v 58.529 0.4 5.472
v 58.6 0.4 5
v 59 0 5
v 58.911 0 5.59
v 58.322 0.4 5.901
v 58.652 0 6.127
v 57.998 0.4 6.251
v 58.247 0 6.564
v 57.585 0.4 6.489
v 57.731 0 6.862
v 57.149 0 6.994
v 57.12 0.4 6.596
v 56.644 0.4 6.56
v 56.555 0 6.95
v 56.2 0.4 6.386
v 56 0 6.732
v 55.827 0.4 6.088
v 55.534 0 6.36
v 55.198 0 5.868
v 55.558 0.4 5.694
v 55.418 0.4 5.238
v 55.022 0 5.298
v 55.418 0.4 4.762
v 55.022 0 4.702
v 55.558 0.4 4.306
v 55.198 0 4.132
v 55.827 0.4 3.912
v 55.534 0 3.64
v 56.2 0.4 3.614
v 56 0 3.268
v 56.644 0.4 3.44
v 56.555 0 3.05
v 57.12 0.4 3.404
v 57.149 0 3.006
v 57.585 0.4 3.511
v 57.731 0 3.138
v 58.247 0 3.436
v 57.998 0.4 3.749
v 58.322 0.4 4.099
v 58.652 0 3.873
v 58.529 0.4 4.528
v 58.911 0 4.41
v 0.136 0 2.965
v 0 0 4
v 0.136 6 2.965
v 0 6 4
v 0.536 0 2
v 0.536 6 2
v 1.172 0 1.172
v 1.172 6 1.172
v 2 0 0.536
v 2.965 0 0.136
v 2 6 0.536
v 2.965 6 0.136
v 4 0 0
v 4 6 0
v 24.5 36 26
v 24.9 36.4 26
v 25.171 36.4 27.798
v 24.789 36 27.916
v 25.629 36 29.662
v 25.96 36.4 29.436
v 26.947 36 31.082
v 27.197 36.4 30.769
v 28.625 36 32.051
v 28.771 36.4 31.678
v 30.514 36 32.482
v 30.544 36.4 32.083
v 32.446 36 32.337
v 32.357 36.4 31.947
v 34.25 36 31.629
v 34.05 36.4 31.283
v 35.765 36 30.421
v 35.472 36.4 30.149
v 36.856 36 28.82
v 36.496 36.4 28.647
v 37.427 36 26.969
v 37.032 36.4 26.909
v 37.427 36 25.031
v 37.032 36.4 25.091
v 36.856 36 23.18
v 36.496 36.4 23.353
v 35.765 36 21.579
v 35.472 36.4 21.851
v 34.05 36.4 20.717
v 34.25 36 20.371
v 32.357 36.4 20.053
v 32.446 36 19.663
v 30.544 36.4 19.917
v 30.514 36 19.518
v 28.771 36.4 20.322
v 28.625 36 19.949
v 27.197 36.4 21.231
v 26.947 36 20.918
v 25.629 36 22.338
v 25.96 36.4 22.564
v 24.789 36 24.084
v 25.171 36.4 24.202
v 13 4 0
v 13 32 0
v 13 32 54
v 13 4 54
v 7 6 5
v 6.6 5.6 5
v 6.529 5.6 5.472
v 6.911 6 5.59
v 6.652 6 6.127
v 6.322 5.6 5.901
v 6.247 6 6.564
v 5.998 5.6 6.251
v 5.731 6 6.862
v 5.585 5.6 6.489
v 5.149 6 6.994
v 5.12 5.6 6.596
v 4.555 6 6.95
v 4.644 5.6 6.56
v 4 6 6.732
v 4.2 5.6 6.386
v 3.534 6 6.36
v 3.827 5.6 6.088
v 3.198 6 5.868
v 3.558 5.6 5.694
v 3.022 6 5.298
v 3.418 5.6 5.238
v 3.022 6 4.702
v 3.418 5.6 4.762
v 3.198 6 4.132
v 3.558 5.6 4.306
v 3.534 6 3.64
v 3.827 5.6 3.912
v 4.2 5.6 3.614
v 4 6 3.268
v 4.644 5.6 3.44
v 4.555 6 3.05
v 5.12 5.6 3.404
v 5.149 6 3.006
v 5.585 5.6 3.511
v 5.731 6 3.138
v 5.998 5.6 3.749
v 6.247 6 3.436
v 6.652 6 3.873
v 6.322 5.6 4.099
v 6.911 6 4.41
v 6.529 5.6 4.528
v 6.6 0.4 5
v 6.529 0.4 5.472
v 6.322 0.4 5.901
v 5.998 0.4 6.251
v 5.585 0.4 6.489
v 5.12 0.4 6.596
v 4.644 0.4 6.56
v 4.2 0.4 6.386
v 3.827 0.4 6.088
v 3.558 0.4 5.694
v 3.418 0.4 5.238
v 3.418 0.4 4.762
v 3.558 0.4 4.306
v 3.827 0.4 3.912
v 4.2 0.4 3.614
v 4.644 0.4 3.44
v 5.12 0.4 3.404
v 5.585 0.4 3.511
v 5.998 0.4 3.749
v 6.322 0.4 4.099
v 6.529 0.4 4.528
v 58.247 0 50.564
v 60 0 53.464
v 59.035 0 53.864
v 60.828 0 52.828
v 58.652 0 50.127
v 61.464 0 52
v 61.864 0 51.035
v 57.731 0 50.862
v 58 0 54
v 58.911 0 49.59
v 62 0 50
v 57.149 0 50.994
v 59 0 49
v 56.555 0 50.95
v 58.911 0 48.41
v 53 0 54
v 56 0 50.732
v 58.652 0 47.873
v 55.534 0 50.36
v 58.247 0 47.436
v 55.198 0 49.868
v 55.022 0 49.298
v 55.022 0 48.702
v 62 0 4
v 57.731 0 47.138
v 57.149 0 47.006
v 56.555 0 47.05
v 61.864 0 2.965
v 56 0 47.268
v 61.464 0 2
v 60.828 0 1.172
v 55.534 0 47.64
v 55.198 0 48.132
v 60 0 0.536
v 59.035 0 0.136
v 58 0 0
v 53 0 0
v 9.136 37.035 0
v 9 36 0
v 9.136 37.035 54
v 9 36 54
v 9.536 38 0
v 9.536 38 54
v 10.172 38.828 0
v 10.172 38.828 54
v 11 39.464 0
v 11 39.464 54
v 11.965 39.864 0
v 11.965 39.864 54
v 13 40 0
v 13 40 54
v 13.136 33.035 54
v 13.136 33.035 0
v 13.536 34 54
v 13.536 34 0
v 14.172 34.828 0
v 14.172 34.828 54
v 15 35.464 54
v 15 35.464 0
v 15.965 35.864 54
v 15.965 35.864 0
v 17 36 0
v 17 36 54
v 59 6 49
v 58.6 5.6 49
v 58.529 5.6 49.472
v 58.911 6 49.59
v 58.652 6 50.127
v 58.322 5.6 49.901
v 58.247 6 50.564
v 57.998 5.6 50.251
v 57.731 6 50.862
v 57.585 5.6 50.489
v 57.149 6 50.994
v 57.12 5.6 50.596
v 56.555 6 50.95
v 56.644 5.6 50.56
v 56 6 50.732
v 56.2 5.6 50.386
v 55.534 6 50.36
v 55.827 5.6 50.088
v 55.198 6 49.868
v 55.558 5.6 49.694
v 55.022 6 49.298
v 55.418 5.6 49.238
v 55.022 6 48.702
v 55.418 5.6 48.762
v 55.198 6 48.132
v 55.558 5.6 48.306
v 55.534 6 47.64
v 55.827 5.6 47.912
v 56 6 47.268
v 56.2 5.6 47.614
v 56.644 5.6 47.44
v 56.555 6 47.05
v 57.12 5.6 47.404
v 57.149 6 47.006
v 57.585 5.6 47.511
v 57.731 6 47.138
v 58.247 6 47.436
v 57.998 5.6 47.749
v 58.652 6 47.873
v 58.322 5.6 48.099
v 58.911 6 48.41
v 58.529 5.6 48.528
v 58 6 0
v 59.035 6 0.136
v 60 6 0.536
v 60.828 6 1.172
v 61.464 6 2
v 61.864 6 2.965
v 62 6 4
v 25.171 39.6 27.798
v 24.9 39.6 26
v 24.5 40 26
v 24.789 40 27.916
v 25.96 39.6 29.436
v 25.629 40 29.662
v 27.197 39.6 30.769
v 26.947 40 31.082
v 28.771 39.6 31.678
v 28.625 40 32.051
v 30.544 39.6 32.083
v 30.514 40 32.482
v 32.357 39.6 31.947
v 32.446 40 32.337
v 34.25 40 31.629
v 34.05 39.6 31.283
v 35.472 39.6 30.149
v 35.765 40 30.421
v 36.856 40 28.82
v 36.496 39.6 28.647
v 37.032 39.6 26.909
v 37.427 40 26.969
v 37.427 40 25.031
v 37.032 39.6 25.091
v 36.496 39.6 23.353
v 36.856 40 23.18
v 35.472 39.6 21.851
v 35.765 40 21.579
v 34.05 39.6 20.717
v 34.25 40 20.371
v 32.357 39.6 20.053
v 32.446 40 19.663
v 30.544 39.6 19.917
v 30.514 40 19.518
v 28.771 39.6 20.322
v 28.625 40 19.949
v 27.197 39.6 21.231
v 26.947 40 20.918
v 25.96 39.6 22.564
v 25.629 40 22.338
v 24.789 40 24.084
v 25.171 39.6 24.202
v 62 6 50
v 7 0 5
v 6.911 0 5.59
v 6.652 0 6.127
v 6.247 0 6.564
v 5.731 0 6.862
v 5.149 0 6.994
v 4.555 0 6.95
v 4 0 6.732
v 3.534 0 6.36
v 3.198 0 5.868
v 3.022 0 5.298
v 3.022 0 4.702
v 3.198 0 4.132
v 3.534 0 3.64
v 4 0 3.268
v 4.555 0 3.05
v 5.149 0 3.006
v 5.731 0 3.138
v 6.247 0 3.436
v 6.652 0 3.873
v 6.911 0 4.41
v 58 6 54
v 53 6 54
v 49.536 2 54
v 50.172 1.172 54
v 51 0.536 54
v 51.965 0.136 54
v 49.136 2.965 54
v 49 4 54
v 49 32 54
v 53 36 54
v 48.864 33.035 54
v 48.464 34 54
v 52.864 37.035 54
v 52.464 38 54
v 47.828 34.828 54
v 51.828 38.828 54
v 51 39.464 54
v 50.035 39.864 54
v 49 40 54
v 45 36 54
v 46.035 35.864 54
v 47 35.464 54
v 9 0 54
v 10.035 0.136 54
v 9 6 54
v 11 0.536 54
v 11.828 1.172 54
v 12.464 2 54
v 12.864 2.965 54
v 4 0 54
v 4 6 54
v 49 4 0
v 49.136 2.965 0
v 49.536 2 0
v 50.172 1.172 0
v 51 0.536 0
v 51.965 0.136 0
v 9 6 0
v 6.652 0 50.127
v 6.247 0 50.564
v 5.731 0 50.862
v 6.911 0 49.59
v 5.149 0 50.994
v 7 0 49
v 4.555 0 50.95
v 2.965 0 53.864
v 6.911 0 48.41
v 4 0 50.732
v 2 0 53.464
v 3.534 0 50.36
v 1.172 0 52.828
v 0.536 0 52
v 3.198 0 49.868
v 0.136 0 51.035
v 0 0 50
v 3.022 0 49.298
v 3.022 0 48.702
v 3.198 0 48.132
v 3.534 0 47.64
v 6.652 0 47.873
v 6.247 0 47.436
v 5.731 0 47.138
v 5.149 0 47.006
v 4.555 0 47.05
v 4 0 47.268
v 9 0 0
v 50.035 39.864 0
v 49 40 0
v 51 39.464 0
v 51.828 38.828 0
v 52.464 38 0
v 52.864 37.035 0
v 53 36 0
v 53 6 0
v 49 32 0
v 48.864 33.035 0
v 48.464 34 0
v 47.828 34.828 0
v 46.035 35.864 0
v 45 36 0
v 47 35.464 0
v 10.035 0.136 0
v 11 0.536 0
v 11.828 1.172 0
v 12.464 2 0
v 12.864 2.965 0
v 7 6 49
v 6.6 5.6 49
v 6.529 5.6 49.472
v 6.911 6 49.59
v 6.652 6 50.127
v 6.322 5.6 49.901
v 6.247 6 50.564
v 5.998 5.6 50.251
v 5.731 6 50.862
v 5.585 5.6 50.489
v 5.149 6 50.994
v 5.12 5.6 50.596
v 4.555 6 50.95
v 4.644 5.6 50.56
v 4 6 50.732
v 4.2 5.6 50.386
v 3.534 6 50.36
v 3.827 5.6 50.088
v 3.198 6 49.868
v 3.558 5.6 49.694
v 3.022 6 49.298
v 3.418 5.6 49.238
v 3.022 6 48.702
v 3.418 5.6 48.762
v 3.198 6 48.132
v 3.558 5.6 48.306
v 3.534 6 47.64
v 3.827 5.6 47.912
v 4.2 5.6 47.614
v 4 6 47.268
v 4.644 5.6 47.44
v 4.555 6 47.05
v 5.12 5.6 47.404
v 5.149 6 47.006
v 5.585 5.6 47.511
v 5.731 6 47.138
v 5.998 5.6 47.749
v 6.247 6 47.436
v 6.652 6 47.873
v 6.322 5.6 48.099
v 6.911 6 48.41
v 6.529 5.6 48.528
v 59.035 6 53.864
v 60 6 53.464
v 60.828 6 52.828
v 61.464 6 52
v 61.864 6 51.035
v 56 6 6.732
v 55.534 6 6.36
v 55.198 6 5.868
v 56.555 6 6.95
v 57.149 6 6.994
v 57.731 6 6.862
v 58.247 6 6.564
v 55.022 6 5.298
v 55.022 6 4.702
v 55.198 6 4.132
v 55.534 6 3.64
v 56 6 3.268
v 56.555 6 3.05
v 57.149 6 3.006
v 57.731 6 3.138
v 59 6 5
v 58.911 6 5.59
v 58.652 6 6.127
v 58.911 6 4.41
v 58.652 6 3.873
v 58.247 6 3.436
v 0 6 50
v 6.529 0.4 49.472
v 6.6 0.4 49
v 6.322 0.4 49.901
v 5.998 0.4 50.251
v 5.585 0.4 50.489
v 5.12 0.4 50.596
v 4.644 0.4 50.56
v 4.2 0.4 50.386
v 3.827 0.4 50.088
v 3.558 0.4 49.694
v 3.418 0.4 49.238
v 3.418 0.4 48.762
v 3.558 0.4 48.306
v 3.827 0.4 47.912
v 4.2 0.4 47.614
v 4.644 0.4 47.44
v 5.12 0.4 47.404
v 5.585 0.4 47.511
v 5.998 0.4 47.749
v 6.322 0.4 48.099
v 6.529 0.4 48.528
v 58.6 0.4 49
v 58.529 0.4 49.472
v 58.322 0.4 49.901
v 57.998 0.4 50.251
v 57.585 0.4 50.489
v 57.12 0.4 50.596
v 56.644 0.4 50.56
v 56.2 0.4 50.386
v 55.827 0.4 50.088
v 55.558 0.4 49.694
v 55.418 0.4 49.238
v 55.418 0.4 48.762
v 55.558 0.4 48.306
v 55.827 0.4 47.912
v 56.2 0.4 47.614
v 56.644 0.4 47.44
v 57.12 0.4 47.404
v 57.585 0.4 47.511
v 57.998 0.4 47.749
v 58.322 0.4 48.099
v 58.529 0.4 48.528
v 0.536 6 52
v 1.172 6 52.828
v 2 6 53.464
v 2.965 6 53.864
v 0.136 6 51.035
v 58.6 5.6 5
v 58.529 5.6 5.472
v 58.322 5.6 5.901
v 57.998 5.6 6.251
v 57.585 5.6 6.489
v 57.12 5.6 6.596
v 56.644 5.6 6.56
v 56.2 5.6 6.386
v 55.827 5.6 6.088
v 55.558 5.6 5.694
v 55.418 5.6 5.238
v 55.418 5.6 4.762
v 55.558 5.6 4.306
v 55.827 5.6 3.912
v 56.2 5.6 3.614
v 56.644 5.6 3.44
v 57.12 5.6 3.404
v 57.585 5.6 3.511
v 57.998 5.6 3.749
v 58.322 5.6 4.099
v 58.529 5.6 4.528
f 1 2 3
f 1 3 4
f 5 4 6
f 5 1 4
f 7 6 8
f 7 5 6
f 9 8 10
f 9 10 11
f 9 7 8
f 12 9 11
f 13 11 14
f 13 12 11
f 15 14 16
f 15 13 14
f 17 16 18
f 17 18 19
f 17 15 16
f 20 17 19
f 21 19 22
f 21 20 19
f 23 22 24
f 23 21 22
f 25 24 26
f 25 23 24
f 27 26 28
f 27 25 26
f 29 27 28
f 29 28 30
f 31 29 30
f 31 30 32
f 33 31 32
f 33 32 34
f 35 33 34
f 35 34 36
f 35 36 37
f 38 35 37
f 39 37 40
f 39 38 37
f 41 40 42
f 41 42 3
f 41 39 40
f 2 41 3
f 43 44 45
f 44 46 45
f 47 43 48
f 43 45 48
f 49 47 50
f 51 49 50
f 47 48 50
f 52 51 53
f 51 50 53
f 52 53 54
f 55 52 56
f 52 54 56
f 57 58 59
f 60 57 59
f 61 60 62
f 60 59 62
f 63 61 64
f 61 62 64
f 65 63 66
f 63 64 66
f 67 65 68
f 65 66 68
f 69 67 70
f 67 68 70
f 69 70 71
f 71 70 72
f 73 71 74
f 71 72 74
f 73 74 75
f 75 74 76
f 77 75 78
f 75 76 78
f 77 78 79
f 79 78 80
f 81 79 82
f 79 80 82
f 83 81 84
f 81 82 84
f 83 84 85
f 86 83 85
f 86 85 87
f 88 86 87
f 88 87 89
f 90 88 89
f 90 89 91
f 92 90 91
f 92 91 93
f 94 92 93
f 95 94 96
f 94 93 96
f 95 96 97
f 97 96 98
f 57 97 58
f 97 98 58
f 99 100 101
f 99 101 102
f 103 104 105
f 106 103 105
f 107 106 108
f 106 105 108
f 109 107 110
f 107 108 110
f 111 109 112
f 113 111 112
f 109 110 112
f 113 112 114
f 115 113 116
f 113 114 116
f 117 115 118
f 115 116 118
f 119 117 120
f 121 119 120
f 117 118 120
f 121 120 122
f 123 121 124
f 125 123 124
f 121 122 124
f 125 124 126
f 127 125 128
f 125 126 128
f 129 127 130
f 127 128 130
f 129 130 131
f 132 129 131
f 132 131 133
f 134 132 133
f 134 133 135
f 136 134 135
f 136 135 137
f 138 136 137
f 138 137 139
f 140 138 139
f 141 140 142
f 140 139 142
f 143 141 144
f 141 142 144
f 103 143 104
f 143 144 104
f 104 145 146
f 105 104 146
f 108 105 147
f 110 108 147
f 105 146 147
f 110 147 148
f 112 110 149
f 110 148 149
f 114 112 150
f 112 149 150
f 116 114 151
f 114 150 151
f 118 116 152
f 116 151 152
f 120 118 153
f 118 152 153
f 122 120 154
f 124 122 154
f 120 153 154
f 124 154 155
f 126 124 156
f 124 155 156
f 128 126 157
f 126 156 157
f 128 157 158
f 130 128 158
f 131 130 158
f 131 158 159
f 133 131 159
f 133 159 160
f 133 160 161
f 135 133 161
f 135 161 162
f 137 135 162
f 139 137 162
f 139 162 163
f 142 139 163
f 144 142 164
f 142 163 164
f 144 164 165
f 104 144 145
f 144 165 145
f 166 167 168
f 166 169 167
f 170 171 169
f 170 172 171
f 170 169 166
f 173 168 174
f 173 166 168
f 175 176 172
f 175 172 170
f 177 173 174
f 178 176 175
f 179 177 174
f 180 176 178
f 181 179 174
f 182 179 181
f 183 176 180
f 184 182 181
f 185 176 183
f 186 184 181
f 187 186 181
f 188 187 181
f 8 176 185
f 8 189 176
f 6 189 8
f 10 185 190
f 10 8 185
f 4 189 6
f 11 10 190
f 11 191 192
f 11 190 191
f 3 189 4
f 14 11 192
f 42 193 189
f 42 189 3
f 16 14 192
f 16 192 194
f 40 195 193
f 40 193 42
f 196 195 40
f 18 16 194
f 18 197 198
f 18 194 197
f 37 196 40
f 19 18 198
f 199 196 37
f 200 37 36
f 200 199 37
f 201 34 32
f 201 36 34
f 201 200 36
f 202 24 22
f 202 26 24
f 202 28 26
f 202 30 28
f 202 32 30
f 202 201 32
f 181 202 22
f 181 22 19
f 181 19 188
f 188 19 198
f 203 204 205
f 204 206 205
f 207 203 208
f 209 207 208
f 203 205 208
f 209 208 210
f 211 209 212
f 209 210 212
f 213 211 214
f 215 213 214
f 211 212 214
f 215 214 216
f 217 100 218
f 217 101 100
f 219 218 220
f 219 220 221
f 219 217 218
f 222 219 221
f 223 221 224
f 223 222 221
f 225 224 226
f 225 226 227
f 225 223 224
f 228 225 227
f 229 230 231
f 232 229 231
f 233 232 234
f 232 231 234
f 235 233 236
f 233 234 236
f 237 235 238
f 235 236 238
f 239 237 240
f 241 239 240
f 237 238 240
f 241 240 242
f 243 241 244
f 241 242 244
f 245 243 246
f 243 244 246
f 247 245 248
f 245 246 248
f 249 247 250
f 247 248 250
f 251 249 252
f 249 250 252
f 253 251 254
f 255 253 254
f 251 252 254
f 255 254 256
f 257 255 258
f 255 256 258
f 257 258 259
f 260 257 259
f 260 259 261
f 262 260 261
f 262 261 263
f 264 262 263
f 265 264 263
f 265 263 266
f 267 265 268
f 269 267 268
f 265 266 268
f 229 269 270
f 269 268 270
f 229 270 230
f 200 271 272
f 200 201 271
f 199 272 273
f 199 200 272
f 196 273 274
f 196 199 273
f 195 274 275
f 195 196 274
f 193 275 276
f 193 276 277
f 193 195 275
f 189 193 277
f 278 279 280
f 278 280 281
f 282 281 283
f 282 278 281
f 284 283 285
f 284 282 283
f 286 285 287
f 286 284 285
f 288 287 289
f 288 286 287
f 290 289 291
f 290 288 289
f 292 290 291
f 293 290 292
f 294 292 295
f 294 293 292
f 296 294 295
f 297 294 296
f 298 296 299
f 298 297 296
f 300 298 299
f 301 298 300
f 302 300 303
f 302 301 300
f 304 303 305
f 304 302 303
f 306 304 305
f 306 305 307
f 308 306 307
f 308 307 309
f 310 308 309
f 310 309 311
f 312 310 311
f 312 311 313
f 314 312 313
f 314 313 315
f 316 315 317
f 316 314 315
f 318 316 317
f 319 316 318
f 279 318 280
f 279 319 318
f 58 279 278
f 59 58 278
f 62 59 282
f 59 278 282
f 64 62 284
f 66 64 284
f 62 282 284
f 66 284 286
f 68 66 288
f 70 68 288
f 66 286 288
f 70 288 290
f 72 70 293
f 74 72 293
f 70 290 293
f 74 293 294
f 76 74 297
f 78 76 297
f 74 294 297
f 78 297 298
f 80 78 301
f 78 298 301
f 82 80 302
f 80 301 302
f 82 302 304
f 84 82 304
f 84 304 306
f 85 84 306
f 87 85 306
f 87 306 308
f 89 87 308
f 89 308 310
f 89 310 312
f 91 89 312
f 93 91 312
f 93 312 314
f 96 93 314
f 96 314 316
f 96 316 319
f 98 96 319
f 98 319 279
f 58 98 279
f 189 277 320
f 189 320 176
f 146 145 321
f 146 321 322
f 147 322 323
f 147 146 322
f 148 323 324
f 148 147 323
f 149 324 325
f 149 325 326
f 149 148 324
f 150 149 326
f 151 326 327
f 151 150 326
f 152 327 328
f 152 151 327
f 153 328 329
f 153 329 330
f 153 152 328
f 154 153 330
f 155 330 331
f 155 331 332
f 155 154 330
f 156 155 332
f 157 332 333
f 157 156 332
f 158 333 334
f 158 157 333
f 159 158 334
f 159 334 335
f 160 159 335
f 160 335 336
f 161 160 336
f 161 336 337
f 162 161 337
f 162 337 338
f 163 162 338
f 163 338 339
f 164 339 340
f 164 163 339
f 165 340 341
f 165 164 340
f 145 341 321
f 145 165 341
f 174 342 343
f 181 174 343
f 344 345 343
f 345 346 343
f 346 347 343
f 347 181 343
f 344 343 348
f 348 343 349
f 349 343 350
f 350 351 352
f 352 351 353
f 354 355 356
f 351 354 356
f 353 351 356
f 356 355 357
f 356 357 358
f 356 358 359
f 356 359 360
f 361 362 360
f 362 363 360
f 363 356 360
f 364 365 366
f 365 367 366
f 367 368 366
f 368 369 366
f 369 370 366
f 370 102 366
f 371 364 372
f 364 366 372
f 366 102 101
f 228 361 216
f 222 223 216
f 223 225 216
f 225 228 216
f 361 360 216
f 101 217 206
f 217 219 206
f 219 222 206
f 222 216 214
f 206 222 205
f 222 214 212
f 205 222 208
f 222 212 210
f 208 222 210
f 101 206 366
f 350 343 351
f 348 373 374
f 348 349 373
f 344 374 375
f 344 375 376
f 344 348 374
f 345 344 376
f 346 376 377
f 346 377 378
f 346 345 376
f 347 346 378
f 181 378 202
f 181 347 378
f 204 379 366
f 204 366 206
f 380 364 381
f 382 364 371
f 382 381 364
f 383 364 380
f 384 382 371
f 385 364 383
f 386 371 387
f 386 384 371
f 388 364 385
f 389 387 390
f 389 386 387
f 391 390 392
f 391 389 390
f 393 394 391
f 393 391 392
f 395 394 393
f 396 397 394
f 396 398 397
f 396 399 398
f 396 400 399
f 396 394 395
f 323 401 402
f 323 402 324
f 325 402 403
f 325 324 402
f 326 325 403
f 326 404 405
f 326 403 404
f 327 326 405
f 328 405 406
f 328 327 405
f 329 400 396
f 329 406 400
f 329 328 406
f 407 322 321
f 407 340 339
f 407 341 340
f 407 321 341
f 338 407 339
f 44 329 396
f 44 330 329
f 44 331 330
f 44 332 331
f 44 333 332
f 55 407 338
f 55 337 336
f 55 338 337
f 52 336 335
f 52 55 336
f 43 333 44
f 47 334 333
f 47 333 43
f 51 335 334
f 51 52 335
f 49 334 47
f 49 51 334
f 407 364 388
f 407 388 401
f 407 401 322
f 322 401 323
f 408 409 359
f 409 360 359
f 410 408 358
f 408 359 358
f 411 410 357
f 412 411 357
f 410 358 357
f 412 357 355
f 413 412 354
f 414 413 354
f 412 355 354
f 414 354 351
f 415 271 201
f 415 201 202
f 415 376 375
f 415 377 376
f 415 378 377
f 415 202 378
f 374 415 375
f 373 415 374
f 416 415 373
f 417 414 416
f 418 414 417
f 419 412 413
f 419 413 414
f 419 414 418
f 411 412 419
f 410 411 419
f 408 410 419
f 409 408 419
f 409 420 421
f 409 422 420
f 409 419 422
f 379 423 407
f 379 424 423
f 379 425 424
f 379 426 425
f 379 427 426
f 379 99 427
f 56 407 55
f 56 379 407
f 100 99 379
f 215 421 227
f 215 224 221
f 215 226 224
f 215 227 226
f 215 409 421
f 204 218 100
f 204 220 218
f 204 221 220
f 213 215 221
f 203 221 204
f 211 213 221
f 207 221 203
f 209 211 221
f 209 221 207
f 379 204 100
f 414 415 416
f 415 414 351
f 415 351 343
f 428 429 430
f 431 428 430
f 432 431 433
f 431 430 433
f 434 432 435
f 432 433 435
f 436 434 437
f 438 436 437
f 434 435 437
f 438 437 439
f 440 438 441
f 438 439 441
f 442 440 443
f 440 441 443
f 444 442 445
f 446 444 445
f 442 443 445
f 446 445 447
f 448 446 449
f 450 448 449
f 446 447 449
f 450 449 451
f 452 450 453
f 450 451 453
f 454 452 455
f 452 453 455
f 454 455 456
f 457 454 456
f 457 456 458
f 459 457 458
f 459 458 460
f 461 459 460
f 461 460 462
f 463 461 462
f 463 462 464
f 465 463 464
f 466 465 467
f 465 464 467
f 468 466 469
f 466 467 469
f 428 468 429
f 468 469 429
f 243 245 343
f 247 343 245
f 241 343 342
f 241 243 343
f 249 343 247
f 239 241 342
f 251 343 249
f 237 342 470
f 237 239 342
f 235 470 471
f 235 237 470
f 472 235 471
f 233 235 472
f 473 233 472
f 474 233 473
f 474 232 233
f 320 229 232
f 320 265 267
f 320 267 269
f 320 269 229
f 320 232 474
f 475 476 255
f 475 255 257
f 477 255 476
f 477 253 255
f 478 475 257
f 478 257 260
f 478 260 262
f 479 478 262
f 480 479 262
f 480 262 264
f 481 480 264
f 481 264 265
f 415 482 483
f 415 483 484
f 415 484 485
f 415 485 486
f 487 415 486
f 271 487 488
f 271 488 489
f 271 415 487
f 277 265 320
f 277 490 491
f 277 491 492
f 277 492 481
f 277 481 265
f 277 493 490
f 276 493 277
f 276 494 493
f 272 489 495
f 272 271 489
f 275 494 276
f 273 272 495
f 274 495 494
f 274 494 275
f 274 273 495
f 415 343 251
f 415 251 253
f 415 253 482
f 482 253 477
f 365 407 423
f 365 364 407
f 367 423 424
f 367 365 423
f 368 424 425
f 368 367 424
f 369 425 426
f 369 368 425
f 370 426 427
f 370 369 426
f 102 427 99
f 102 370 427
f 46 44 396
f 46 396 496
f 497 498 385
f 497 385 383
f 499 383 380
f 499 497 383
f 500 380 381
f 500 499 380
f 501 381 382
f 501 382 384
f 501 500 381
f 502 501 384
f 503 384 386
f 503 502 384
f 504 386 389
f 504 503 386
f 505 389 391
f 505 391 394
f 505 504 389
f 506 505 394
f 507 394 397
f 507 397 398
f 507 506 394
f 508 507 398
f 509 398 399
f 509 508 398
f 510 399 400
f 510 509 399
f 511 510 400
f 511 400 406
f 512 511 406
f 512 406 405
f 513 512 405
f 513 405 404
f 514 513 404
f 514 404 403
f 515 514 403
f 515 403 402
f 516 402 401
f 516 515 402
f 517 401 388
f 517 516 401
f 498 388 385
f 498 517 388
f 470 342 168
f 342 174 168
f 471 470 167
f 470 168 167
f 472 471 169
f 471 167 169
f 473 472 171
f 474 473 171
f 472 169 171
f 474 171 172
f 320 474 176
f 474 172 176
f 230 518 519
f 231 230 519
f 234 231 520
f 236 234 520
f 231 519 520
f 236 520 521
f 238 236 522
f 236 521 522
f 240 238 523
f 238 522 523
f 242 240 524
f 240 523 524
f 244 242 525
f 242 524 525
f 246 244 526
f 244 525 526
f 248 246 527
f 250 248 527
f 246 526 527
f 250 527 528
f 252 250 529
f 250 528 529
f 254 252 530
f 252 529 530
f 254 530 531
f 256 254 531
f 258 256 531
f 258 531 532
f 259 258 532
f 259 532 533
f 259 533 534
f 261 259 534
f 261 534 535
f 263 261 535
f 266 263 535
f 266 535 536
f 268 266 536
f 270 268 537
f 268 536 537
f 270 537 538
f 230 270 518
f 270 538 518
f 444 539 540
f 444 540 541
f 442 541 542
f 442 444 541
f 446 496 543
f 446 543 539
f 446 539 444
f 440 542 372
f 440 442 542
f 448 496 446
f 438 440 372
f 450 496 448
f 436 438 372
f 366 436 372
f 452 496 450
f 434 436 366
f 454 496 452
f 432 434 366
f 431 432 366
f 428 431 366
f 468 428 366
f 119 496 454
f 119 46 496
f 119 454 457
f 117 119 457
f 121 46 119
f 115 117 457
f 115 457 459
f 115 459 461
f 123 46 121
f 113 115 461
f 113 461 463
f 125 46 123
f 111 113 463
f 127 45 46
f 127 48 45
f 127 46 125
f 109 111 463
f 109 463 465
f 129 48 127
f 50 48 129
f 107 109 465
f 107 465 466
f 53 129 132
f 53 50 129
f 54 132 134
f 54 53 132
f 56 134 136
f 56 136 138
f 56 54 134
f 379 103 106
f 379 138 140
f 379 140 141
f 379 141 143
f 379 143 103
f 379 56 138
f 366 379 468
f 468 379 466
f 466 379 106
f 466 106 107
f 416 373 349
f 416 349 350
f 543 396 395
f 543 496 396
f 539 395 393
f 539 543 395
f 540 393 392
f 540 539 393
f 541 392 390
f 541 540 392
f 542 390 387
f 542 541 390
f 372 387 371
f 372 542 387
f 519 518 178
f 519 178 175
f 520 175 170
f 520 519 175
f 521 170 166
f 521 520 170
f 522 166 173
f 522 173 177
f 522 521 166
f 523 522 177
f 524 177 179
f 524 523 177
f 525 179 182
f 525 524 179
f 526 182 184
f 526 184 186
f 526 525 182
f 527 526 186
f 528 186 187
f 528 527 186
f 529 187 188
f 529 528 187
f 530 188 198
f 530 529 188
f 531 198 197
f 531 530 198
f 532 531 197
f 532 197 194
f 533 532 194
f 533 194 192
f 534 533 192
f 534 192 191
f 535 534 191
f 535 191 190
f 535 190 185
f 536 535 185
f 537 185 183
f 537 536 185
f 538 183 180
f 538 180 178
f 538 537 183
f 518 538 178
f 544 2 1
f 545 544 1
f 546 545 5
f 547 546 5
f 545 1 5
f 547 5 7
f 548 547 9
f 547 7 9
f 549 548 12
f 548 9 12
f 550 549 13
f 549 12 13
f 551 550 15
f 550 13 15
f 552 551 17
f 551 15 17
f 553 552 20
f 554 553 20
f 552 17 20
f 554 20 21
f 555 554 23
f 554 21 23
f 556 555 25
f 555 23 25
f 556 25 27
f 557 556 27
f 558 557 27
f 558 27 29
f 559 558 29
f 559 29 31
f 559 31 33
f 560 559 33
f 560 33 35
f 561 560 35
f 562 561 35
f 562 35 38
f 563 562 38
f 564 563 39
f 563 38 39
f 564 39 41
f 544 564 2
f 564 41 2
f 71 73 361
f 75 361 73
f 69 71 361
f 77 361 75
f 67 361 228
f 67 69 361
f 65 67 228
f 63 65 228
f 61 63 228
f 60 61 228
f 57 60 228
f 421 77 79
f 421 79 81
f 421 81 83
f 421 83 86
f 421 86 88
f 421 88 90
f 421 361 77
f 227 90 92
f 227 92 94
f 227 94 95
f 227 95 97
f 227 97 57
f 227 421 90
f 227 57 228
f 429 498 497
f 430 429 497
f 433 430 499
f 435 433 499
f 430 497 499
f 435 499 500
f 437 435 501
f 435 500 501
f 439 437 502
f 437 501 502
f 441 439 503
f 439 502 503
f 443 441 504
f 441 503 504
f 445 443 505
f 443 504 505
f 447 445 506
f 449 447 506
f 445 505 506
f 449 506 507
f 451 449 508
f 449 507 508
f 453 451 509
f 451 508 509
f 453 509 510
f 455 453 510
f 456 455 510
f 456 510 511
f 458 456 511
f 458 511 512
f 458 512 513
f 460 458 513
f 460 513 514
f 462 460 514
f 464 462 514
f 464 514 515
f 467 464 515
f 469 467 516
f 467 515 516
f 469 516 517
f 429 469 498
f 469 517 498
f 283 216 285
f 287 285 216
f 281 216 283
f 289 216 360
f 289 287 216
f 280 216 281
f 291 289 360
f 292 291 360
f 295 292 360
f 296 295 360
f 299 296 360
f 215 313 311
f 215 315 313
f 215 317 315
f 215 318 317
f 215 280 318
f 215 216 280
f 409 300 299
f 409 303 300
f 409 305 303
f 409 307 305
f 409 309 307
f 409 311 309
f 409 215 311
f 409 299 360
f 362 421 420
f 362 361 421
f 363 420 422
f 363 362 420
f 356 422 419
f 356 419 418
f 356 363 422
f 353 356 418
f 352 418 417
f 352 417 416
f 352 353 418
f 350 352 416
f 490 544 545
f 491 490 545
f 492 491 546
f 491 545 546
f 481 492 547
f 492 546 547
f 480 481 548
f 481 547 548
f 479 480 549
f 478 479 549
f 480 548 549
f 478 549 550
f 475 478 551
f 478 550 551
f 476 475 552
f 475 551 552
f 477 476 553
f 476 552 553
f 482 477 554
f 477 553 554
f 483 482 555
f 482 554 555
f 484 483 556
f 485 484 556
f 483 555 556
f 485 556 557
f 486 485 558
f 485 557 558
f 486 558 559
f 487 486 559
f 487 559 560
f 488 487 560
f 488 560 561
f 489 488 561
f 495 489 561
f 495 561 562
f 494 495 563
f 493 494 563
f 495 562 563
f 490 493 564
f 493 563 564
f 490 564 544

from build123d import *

# Parameters (mm, degrees)
PAD_DEPTH       = 54
SKETCH001_R     = 1.6
POCKET_DEPTH    = 6
SKETCH002_R     = 6.1
POCKET001_DEPTH = 5
FILLET_R        = 4
FILLET001_R     = 4
FILLET002_R     = 4
FILLET003_R     = 4
CHAMFER_SIZE    = 0.4
CHAMFER001_SIZE = 0.4
CHAMFER002_SIZE = 0.4
CHAMFER003_SIZE = 0.4


with BuildPart() as part:
    # Sketch → Pad (new body)
    with BuildSketch(Plane.XY):
        Polygon((0, 0), (0, 6), (9, 6), (9, 40), (53, 40), (53, 6), (62, 6), (62, 0), (49, 0), (49, 36), (13, 36), (13, 0), align=None)
    extrude(amount=PAD_DEPTH)

    # Sketch001 (on Face8 of Pad) → Pocket (cut)
    with BuildSketch(Plane.XZ):
        with Locations((5, 5)):
            Circle(SKETCH001_R)
        with Locations((57, 5)):
            Circle(SKETCH001_R)
        with Locations((57, 49)):
            Circle(SKETCH001_R)
        with Locations((5, 49)):
            Circle(SKETCH001_R)
    extrude(amount=-POCKET_DEPTH, mode=Mode.SUBTRACT)

    # Sketch002 (on Face10 of Pocket) → Pocket001 (cut)
    with BuildSketch(Plane(origin=(0, 40, 0), x_dir=(-1, 0, 0), z_dir=(0, 1, 0))):
        with Locations((-31, 26)):
            Circle(SKETCH002_R)
    extrude(amount=-POCKET001_DEPTH, mode=Mode.SUBTRACT)

    # Fillet
    fillet_edges = [part.edges().sort_by_distance(p)[0] for p in [
        (62, 3, 0),
        (62, 3, 54),
        (0, 3, 54),
        (0, 3, 0),
    ]]
    fillet(fillet_edges, radius=FILLET_R)

    # Fillet001
    fillet001_edges = [part.edges().sort_by_distance(p)[0] for p in [
        (53, 40, 27),
        (9, 40, 27),
    ]]
    fillet(fillet001_edges, radius=FILLET001_R)

    # Fillet002
    fillet002_edges = [part.edges().sort_by_distance(p)[0] for p in [
        (49, 0, 27),
        (13, 0, 27),
    ]]
    fillet(fillet002_edges, radius=FILLET002_R)

    # Fillet003
    fillet003_edges = [part.edges().sort_by_distance(p)[0] for p in [
        (49, 36, 27),
        (13, 36, 27),
    ]]
    fillet(fillet003_edges, radius=FILLET003_R)

    # Chamfer
    chamfer_edges = [part.edges().sort_by_distance(p)[0] for p in [
        (37.1, 40, 26),
    ]]
    chamfer(chamfer_edges, length=CHAMFER_SIZE)

    # Chamfer001
    chamfer001_edges = [part.edges().sort_by_distance(p)[0] for p in [
        (55.4, 6, 5),
        (55.4, 6, 49),
        (3.4, 6, 5),
        (3.4, 6, 49),
    ]]
    chamfer(chamfer001_edges, length=CHAMFER001_SIZE)

    # Chamfer002
    chamfer002_edges = [part.edges().sort_by_distance(p)[0] for p in [
        (37.1, 36, 26),
    ]]
    chamfer(chamfer002_edges, length=CHAMFER002_SIZE)

    # Chamfer003
    chamfer003_edges = [part.edges().sort_by_distance(p)[0] for p in [
        (3.4, 0, 49),
        (3.4, 0, 5),
        (55.4, 0, 49),
        (55.4, 0, 5),
    ]]
    chamfer(chamfer003_edges, length=CHAMFER003_SIZE)


solid = part.part
